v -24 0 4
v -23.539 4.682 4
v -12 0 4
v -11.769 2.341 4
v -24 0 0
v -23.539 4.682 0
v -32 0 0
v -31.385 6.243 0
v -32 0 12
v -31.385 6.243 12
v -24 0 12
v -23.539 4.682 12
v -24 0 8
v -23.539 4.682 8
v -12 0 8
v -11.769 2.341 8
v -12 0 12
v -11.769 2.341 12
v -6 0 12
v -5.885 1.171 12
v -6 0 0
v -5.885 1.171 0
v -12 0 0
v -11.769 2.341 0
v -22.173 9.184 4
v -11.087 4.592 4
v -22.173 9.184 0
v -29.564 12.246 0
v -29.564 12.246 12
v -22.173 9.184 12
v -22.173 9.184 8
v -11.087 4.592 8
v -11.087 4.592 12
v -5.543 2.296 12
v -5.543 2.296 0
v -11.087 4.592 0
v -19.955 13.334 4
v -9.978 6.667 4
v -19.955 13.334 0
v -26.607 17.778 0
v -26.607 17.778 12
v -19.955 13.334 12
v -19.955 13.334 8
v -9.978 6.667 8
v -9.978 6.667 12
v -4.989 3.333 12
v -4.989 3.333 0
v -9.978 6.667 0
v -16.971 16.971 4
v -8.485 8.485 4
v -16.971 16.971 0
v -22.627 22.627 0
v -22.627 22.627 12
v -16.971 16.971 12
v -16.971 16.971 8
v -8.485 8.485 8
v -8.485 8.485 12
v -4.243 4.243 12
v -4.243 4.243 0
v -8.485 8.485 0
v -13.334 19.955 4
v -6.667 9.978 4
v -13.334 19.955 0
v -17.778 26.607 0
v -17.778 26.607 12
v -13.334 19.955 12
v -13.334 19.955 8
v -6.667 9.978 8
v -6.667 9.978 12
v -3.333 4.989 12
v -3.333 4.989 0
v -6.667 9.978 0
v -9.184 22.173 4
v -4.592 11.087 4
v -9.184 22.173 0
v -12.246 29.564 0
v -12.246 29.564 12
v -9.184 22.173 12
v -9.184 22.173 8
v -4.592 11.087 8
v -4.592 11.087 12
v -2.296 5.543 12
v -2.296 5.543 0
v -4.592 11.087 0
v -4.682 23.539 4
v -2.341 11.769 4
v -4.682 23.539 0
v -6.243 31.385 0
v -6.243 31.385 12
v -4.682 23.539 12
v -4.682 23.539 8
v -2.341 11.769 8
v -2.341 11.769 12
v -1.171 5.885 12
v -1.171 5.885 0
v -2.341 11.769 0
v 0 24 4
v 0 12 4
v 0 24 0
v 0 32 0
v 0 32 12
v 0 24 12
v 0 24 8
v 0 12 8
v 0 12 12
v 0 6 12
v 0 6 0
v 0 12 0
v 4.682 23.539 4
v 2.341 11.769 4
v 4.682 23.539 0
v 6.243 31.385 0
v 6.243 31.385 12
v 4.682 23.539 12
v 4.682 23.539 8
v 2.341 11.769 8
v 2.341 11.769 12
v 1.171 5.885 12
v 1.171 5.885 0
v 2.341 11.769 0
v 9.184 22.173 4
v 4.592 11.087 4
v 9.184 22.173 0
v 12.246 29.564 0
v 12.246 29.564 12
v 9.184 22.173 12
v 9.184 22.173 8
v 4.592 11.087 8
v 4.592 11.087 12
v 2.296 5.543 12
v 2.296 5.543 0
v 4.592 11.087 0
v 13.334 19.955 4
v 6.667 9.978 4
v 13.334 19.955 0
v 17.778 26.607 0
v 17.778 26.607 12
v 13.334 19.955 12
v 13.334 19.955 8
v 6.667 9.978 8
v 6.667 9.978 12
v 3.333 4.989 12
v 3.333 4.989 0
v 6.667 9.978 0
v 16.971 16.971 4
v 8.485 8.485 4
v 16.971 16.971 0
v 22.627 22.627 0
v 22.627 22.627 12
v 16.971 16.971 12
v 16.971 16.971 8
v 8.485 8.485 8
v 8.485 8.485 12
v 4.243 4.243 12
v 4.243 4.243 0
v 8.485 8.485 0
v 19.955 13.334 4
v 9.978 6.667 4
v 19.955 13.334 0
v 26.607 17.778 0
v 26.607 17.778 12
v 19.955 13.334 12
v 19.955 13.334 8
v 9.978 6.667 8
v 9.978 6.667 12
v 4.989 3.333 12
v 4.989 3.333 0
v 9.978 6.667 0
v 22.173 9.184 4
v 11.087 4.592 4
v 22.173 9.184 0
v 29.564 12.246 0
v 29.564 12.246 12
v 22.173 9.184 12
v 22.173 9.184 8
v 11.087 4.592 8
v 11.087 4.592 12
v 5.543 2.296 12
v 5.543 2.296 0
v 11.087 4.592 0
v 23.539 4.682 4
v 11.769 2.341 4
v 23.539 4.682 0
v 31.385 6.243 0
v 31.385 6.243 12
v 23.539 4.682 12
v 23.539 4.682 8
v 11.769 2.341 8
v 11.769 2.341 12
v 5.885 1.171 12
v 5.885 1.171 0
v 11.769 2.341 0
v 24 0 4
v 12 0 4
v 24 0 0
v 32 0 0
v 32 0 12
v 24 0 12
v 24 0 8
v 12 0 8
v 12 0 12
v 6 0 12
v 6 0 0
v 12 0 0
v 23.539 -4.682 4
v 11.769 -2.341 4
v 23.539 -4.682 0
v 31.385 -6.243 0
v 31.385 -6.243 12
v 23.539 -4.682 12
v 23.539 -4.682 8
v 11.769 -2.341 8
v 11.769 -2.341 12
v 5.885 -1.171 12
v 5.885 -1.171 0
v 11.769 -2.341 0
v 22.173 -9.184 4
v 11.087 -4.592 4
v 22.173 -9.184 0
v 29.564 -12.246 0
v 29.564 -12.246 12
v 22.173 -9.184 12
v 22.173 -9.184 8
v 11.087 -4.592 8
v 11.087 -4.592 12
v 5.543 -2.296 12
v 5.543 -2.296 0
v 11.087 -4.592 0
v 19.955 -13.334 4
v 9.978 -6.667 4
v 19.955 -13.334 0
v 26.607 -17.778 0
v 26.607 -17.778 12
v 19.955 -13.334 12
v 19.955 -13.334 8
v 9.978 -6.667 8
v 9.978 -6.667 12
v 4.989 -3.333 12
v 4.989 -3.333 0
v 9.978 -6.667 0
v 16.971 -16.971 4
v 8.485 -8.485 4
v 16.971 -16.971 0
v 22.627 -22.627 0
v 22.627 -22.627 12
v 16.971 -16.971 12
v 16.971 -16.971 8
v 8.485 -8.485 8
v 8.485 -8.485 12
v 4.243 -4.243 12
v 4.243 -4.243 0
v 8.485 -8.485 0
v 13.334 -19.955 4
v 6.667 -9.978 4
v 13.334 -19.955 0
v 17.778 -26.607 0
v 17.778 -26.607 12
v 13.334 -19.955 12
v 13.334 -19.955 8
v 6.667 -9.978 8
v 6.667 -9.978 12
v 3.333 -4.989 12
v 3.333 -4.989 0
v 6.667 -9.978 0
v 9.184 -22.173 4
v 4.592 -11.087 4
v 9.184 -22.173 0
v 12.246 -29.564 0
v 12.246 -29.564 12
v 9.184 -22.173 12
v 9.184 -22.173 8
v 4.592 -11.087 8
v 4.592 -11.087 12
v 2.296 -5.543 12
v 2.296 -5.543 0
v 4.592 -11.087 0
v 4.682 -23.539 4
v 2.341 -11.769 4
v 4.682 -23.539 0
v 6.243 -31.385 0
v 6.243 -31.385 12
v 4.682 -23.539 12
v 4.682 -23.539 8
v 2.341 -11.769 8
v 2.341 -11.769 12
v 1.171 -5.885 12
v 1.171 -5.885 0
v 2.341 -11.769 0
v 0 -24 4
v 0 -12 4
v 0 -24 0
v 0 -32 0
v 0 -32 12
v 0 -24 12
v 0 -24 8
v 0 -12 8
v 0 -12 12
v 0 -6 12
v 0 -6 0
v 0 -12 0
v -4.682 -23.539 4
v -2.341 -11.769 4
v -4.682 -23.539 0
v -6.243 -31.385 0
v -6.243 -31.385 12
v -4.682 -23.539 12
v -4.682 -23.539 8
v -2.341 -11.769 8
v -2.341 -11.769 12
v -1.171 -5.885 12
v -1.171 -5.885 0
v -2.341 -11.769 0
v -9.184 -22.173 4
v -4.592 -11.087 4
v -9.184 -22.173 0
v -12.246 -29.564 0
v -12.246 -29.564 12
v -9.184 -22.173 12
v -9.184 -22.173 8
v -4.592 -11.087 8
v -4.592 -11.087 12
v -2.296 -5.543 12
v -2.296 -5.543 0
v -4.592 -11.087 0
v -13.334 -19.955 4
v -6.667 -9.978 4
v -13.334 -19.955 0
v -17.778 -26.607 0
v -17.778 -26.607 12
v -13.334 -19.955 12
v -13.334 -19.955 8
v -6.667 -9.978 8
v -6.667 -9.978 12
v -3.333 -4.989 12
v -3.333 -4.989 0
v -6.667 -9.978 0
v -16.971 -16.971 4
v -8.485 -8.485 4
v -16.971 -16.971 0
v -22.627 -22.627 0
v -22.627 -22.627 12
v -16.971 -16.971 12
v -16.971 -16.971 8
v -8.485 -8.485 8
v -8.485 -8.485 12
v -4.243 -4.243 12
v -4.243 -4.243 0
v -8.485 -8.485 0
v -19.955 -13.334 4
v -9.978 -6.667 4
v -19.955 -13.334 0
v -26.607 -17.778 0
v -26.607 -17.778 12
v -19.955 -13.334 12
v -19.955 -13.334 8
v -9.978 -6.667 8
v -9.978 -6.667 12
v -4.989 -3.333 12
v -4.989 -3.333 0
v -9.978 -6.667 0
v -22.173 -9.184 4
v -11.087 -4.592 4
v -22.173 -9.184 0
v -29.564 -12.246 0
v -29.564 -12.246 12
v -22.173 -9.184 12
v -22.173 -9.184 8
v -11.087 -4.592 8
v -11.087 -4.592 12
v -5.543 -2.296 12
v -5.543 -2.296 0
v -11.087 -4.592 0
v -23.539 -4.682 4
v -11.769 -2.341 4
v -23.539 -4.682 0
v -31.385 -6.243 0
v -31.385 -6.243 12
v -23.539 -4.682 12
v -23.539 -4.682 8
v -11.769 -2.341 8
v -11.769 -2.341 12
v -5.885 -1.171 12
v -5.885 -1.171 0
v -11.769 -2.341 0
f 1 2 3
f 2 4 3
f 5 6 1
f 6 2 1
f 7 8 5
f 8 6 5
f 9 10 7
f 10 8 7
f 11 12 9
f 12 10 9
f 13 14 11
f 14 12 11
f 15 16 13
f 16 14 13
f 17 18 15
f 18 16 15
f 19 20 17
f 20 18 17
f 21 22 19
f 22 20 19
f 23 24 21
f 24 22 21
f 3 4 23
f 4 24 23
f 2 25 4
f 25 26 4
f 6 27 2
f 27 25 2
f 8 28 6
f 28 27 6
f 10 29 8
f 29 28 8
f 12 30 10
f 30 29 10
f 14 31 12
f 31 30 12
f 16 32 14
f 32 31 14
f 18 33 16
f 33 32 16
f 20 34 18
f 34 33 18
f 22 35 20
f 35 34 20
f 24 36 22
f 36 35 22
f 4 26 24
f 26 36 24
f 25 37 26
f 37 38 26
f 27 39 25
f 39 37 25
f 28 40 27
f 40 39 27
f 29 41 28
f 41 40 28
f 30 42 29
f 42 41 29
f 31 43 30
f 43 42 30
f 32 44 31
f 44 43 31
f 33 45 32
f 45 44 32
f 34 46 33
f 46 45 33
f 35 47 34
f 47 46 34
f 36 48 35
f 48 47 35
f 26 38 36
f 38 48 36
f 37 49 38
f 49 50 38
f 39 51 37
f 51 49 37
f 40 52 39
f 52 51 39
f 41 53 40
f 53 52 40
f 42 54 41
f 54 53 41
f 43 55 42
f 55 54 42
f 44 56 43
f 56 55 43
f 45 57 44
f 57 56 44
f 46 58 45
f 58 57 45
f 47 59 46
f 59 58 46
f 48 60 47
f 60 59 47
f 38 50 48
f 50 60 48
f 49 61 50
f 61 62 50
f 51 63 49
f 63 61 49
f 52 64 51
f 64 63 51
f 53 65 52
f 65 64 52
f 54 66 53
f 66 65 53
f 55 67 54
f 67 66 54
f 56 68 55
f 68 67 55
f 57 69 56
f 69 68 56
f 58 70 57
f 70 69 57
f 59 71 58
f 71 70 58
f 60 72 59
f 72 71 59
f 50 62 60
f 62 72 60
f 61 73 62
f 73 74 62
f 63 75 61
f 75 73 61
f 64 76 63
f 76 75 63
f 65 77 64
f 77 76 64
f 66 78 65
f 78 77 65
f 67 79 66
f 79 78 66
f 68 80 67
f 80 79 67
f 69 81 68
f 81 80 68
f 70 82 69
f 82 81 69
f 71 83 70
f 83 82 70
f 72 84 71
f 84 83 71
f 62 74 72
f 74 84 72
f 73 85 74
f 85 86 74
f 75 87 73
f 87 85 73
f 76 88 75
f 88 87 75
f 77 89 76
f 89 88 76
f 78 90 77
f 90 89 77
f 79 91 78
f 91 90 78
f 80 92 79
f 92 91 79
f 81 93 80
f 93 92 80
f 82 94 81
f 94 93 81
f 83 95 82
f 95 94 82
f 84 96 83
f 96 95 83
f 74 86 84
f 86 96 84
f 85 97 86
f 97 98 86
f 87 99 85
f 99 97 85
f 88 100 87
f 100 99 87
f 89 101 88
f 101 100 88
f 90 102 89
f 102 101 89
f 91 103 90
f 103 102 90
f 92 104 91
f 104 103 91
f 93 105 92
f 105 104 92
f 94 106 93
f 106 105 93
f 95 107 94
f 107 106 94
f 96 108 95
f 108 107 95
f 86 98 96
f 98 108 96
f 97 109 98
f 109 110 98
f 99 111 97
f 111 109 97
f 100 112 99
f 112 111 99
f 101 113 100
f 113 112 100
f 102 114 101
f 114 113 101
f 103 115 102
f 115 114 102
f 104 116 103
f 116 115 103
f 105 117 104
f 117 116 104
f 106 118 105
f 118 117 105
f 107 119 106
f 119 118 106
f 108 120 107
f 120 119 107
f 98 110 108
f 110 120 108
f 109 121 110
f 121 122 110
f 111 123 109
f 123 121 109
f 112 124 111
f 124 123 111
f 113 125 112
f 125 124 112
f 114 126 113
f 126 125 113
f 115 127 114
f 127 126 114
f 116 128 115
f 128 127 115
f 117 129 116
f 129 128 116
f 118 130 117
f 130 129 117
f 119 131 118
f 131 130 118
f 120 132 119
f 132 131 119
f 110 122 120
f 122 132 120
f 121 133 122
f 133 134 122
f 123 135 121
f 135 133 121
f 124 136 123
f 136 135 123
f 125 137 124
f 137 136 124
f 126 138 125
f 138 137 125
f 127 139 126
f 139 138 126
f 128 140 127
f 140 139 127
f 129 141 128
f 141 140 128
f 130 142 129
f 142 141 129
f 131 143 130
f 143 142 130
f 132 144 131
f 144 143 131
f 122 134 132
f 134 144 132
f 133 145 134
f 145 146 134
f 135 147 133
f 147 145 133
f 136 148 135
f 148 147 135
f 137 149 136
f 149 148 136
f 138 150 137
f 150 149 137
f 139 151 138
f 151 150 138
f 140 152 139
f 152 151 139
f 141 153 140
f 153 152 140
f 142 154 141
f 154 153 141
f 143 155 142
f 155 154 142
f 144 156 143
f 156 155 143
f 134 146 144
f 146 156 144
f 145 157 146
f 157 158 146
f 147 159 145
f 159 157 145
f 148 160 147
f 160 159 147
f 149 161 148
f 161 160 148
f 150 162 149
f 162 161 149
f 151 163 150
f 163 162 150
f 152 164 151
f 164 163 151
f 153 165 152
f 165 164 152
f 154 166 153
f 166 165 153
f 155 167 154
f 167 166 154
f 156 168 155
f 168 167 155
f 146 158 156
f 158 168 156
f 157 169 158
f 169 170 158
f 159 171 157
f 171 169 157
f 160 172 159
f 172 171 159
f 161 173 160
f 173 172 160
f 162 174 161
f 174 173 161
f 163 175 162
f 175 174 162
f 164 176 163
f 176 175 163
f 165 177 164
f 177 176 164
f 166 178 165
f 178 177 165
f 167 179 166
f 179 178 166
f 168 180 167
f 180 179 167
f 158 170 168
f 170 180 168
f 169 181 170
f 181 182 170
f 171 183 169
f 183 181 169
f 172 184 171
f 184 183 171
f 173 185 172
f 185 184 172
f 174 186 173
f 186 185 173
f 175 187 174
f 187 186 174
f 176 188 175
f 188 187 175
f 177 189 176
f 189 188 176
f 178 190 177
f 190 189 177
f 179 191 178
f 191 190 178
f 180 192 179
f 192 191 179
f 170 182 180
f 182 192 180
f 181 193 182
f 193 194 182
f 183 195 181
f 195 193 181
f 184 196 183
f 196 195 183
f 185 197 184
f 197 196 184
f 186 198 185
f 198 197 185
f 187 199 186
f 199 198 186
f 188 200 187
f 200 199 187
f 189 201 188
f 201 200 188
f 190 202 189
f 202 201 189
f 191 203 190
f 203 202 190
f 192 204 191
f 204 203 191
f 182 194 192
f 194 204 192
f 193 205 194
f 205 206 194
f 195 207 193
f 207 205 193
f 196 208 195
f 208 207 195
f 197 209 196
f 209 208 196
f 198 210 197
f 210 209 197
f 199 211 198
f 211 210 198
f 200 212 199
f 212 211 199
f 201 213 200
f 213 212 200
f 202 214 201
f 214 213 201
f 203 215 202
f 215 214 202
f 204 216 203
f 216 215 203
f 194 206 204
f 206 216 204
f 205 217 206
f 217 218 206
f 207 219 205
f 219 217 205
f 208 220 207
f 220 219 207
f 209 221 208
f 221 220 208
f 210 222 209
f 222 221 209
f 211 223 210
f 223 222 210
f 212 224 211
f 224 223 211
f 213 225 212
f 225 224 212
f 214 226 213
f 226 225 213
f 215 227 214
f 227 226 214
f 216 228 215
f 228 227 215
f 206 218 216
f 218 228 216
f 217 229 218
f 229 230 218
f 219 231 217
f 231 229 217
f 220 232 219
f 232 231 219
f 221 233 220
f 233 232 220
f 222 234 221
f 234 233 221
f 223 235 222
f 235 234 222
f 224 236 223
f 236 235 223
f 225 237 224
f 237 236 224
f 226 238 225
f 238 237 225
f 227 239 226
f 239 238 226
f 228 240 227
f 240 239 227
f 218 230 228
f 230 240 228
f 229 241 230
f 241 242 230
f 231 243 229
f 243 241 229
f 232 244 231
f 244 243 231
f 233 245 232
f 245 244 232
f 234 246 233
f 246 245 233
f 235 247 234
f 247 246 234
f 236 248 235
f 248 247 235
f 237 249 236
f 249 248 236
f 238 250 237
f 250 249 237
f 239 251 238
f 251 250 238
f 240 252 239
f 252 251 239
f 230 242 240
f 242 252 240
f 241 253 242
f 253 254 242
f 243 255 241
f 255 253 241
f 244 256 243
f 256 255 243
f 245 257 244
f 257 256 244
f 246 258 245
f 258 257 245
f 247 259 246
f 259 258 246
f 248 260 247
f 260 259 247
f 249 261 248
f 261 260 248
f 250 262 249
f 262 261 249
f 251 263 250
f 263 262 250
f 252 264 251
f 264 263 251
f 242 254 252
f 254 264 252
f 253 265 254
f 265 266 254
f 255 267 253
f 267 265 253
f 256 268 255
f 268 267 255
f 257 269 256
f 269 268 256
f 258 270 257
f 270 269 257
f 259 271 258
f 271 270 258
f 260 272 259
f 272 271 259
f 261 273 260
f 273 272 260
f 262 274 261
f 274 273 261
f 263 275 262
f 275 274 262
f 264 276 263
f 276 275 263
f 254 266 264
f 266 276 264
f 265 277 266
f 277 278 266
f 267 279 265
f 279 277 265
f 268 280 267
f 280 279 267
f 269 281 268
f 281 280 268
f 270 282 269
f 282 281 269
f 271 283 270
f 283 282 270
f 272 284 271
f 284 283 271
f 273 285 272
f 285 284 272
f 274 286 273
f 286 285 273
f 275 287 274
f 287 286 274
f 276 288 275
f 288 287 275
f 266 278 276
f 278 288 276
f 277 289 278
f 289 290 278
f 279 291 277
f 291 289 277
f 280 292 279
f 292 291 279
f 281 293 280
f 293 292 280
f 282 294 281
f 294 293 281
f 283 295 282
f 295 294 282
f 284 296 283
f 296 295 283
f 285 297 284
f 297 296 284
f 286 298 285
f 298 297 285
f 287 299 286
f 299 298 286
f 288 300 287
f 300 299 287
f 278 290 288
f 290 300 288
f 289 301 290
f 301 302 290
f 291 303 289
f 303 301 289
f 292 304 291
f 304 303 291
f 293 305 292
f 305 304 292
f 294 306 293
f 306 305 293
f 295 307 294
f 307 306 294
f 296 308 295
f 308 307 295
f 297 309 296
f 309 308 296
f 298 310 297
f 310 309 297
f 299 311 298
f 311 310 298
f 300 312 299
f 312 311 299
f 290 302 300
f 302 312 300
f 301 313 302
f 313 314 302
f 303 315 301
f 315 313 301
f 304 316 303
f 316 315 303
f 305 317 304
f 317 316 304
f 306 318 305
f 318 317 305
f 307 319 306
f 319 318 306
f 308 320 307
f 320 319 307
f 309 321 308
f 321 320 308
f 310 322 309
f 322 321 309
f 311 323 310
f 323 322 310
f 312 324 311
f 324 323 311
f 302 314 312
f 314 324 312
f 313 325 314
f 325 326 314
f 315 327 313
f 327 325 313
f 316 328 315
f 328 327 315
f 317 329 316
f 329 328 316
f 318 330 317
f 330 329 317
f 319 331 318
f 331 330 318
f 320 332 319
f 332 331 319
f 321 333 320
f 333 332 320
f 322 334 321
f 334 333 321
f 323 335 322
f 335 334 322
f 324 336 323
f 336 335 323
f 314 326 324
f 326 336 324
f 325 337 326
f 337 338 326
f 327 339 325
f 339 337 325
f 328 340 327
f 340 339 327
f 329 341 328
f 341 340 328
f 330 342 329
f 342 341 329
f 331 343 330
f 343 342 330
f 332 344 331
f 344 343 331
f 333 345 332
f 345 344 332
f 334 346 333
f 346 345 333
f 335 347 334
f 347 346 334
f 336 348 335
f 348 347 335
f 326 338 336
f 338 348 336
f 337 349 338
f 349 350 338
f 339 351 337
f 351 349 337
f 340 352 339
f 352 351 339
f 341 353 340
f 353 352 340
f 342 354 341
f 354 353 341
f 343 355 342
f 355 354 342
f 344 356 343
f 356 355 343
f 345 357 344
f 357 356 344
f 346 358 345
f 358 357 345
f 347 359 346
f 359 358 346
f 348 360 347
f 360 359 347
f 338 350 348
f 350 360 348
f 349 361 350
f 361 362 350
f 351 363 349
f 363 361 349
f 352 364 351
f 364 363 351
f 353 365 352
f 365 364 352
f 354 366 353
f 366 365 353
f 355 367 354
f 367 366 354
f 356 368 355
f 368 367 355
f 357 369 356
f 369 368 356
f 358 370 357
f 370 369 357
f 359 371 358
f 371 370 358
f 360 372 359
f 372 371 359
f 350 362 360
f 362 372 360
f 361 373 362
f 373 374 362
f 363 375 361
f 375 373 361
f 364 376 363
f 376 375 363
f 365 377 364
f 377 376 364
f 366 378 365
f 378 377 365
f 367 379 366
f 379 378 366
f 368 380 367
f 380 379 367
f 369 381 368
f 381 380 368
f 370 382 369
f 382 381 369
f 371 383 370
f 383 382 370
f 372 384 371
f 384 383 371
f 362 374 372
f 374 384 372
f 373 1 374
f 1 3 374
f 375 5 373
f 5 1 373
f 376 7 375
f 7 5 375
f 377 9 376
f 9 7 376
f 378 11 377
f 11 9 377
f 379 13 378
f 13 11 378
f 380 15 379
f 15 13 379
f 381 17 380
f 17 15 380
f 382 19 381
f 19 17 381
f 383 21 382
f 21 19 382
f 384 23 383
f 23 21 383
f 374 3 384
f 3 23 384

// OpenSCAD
$fn = 32;

// ----------------------------------------------------------------------
// Revolved part: handwheel R32
// ----------------------------------------------------------------------

// --- parameters (mm) ---
bore_r = 6;               // bore radius
rim_r = 32;               // rim radius
rim_w = 8;                // rim axial width
rim_t = 12;               // rim diameter height
hub_r = 12;               // hub radius
web_t = 4;                // web thickness
revolve_angle = 360;      // revolve sweep, degrees

bore_d = 2 * bore_r;
rim_d = 2 * rim_r;
hub_d = 2 * hub_r;

profile = [[6, 0], [12, 0], [12, 4], [24, 4], [24, 0], [32, 0], [32, 12], [24, 12], [24, 8], [12, 8], [12, 12], [6, 12]];  // primary outline, 12 points, counter clockwise

// --- the one profile operation ---
rotate_extrude(angle = revolve_angle) polygon(points = profile);
